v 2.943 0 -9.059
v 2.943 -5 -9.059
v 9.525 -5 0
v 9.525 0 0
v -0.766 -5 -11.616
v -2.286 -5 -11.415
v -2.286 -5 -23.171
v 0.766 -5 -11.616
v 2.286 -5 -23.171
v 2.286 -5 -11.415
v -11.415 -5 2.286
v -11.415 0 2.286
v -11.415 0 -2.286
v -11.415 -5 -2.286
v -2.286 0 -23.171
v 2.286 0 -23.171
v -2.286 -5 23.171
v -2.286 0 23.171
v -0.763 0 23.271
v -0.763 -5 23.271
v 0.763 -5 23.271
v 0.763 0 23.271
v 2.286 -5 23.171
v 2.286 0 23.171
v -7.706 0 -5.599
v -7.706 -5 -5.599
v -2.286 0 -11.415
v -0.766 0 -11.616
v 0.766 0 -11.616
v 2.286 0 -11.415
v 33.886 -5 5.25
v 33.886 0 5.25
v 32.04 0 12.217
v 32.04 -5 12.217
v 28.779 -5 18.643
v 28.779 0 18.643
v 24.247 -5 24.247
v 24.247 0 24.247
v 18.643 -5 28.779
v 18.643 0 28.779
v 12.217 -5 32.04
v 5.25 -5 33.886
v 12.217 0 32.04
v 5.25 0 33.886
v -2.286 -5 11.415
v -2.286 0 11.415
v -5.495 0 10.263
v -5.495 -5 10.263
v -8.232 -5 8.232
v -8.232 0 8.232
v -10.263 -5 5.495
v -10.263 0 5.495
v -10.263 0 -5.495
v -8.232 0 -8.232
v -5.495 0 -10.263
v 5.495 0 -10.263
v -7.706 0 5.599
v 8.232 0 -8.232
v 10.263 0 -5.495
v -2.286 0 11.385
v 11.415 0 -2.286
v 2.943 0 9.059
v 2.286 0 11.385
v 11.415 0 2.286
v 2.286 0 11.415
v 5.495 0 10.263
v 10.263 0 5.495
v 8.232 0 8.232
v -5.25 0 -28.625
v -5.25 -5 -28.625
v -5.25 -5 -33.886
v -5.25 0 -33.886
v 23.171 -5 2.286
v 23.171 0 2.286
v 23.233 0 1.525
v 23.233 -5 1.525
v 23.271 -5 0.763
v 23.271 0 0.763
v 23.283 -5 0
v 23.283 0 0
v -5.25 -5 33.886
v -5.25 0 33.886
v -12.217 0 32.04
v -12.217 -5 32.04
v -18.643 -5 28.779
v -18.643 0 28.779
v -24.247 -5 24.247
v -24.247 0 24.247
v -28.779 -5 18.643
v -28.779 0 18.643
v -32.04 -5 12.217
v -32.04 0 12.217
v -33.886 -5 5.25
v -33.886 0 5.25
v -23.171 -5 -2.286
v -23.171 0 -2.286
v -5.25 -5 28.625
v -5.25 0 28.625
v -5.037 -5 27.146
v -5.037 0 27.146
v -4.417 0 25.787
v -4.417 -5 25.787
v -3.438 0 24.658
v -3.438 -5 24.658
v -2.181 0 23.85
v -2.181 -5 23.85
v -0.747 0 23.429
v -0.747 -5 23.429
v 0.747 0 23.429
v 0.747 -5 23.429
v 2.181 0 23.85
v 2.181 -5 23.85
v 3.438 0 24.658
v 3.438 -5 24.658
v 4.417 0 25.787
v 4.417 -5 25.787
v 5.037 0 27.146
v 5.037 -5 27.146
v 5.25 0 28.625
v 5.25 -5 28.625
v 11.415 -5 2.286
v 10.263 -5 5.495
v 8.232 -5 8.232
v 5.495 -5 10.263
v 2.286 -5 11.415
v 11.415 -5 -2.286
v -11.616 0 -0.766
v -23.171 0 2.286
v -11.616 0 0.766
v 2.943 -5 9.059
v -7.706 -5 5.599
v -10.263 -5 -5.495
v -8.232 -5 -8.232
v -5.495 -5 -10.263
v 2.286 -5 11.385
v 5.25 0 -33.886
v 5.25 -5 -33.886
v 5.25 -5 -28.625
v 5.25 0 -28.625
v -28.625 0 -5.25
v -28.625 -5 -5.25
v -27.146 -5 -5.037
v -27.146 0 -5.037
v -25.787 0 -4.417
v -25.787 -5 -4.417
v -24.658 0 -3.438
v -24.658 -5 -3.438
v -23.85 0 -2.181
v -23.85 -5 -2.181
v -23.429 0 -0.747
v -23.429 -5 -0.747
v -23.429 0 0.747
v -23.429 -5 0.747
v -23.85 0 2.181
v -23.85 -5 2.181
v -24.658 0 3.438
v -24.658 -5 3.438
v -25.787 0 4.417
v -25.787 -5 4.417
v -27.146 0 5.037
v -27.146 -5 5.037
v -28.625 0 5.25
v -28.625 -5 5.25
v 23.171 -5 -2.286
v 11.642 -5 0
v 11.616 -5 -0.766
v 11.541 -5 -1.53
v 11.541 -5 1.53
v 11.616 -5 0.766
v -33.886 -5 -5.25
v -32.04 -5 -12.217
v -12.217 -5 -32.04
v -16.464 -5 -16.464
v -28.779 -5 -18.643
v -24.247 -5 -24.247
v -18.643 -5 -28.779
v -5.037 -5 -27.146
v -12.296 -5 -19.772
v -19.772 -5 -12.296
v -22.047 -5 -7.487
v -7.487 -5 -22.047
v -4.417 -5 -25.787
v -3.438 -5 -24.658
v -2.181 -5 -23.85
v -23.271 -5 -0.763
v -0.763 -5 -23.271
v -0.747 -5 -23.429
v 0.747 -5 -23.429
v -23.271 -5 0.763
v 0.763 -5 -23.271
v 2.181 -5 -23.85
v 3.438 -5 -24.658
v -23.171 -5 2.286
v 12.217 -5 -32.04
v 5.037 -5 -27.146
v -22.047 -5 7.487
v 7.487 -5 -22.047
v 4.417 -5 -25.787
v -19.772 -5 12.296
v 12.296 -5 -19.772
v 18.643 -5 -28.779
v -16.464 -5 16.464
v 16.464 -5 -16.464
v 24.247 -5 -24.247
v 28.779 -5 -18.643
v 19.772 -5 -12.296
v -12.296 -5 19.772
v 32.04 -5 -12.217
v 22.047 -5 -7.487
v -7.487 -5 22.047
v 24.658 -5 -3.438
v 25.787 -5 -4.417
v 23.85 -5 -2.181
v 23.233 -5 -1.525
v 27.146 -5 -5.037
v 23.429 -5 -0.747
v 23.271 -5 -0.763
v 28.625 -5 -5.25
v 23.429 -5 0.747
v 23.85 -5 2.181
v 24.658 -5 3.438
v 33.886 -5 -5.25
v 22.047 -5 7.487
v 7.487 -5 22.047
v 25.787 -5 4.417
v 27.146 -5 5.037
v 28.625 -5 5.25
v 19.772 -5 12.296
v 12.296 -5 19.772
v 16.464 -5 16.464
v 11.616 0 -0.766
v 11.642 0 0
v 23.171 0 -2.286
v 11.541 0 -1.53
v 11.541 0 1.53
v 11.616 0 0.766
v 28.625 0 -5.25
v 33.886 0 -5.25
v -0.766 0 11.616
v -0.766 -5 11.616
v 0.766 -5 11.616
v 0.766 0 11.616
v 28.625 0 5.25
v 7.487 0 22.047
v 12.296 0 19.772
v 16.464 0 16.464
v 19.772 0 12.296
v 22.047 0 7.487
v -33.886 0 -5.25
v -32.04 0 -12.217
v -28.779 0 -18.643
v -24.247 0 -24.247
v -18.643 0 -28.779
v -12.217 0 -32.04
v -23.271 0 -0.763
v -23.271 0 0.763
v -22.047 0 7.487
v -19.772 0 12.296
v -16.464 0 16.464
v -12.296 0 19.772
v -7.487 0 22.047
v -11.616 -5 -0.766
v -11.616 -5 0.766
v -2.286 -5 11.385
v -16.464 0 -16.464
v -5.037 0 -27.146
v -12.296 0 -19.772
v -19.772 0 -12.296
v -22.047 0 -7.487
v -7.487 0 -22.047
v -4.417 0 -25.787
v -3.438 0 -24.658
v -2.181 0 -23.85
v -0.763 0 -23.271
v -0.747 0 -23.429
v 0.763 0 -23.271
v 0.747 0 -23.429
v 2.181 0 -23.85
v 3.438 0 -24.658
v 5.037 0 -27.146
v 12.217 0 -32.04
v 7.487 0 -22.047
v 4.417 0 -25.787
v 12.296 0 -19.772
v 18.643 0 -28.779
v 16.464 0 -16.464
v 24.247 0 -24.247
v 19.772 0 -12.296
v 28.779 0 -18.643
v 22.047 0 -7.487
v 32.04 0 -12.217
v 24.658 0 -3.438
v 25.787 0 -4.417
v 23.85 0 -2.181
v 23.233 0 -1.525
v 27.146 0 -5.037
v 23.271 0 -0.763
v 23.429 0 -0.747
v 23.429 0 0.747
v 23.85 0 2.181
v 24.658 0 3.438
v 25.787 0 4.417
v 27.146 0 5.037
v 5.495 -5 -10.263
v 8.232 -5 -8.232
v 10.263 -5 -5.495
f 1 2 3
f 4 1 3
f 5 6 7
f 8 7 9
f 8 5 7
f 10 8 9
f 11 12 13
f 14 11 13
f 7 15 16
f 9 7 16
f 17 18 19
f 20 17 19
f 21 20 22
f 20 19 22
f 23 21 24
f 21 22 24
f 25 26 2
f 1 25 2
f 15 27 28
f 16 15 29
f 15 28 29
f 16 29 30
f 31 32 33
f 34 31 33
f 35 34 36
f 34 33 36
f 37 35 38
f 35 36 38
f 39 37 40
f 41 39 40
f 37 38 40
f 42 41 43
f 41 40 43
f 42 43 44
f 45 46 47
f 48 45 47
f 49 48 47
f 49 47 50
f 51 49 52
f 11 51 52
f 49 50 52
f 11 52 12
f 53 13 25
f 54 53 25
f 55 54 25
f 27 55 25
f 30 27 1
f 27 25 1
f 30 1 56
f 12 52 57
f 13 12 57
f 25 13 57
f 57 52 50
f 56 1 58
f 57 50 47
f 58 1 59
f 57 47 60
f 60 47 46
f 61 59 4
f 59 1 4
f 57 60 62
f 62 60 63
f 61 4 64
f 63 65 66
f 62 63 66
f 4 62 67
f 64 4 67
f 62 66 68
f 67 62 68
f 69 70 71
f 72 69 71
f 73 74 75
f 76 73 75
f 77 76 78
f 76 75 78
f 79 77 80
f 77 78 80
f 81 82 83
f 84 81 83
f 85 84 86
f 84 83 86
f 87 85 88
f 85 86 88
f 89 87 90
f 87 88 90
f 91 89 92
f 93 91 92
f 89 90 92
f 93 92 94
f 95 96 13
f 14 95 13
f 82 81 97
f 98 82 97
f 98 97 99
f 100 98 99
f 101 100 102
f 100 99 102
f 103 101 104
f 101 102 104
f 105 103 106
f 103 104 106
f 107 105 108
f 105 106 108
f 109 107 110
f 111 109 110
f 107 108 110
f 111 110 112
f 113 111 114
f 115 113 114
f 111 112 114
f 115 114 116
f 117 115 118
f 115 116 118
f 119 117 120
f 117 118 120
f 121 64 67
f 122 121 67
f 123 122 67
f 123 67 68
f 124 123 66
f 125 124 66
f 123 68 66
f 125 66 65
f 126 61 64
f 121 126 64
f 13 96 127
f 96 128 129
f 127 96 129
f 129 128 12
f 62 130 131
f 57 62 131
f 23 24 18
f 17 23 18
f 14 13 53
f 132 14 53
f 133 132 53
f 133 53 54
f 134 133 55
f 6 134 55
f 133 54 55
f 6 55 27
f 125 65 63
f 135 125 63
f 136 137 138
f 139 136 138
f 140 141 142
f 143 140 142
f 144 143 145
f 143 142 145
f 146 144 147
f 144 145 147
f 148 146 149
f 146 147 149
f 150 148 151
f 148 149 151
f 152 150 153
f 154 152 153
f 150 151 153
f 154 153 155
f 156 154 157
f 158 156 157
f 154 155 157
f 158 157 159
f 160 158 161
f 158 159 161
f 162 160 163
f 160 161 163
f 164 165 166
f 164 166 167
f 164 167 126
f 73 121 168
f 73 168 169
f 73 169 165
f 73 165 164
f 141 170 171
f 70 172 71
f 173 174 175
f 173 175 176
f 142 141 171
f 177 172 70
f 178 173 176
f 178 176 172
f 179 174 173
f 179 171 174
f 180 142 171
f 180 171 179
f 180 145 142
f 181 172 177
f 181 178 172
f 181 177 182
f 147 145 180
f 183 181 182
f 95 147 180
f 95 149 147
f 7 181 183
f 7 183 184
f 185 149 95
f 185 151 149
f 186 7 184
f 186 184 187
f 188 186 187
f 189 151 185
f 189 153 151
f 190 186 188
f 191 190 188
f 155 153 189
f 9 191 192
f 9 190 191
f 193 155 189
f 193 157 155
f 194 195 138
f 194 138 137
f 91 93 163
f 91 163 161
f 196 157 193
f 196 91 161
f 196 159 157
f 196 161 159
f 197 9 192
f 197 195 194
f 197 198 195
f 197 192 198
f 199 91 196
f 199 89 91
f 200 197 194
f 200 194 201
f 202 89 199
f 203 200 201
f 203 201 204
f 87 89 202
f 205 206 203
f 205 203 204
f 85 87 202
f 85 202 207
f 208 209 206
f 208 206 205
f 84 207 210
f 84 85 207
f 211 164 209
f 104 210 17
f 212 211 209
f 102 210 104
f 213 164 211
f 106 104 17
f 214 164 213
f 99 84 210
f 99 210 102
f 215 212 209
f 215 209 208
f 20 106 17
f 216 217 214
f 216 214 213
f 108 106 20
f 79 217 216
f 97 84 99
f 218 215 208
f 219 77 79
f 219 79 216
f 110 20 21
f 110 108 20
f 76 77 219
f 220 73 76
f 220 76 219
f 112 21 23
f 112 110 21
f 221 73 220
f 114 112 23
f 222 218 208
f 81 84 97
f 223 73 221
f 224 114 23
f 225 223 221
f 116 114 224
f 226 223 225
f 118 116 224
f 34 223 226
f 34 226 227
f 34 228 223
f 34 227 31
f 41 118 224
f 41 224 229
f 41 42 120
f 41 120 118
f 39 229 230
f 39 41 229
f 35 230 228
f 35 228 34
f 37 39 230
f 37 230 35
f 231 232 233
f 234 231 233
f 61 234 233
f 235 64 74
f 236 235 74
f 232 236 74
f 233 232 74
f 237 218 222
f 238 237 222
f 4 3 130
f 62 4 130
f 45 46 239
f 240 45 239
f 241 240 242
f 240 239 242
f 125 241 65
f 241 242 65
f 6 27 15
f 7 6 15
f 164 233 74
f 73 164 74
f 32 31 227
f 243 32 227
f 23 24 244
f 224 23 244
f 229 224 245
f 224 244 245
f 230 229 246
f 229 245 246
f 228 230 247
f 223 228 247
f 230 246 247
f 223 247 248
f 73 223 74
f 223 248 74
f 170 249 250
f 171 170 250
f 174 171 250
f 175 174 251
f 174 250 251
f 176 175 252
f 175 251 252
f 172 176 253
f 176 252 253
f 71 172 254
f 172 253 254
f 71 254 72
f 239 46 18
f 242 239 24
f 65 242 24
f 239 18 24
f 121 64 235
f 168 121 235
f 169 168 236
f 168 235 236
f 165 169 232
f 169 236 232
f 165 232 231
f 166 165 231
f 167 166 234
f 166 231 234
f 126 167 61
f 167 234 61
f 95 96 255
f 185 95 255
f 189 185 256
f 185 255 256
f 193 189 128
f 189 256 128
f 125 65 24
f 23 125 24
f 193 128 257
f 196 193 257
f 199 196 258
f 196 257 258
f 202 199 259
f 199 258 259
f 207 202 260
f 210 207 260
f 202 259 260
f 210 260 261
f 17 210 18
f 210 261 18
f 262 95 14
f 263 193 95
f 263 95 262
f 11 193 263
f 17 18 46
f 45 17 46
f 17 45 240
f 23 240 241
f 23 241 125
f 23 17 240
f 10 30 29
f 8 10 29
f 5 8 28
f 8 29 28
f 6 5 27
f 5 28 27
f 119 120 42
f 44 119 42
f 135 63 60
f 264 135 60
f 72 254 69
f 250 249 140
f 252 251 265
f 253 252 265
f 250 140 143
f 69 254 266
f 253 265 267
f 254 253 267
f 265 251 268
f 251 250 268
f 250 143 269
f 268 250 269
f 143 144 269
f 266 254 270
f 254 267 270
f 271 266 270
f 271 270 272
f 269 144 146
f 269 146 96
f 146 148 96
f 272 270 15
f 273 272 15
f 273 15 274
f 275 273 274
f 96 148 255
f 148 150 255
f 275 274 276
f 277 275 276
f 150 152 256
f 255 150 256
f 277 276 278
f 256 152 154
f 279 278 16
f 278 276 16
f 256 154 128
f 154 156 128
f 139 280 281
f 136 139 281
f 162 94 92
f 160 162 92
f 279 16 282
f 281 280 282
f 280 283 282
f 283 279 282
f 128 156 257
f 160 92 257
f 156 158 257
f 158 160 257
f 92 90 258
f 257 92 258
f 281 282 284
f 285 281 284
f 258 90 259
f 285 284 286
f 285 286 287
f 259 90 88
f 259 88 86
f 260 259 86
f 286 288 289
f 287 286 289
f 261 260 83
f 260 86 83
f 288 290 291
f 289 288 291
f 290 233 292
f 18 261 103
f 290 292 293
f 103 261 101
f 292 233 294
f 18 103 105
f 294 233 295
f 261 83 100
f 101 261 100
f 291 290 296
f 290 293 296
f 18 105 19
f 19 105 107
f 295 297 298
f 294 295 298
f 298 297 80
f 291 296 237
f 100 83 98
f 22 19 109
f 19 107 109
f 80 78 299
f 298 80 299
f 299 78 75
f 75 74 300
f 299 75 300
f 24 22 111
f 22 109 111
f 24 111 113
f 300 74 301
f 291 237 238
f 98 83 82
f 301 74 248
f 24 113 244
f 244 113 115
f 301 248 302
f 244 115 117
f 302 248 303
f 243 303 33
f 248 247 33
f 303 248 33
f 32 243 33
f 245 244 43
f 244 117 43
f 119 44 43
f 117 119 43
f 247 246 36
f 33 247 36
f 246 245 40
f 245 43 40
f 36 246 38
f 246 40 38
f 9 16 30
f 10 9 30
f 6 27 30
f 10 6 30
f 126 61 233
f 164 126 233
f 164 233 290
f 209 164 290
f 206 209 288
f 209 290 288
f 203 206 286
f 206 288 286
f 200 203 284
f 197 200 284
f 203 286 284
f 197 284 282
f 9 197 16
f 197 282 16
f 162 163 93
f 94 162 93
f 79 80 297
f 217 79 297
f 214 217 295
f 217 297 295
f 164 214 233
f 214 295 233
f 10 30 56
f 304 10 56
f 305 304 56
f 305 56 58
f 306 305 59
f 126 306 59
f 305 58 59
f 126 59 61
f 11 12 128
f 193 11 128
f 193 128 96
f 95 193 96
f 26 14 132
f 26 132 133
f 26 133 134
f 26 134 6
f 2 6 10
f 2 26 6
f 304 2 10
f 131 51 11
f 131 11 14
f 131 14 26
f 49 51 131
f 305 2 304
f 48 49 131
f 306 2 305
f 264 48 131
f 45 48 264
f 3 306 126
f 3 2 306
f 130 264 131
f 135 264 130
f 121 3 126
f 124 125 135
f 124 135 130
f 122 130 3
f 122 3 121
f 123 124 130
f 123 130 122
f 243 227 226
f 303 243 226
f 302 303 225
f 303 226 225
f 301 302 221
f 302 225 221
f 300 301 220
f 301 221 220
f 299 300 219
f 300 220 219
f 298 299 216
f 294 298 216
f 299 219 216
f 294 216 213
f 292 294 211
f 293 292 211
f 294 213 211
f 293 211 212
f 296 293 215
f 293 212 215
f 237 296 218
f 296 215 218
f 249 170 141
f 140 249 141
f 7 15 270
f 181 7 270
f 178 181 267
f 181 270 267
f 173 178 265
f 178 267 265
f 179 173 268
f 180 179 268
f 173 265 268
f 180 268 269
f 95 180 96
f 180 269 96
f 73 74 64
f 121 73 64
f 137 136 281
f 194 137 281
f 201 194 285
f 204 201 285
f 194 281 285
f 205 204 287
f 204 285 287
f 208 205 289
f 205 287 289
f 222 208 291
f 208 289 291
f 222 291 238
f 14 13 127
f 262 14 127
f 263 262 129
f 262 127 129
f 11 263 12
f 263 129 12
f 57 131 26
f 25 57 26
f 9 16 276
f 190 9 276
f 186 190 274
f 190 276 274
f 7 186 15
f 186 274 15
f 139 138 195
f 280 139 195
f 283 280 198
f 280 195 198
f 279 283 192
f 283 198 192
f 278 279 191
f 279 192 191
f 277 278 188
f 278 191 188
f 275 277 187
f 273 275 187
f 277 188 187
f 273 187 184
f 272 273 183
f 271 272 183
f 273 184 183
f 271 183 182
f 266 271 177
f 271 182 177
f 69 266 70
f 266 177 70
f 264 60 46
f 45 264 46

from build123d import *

# Parameters (mm, degrees)
F1_DEPTH = 5
F0_R     = 34.29
F3_DEPTH = 5.001
F5_DEPTH = 5.001


with BuildPart() as f1:
    # F0 (on Front) → F1 (new body)
    with BuildSketch(Plane.XZ):
        with BuildLine():
            ThreePointArc((-11.4150167226, -2.286), (-11.6416666667, 0), (-11.4150167226, 2.286))
            Line((-11.4150167226, 2.286), (-23.1708397584, 2.286))
            Line((-23.1708397584, 2.286), (-23.1708397584, -2.286))
            Line((-23.1708397584, -2.286), (-11.4150167226, -2.286))
        make_face()
    extrude(amount=F1_DEPTH)


with BuildPart() as f1b:
    # F0 (on Front) → F1, piece 2 (new body)
    with BuildSketch(Plane.XZ):
        with BuildLine():
            Line((11.4150167226, -2.286), (11.4150167226, 2.286))
            ThreePointArc((11.4150167226, 2.286), (8.2319014443, 8.2319014443), (2.286, 11.4150167226))
            Line((2.286, 11.4150167226), (2.286, 11.3852397584))
            Line((2.286, 11.3852397584), (-2.286, 11.3852397584))
            Line((-2.286, 11.3852397584), (-2.286, 11.4150167226))
            ThreePointArc((-2.286, 11.4150167226), (-8.2319014443, 8.2319014443), (-11.4150167226, 2.286))
            Line((-11.4150167226, 2.286), (-11.4150167226, -2.286))
            ThreePointArc((-11.4150167226, -2.286), (-8.2319014443, -8.2319014443), (-2.286, -11.4150167226))
            Line((-2.286, -11.4150167226), (2.286, -11.4150167226))
            ThreePointArc((2.286, -11.4150167226), (8.2319014443, -8.2319014443), (11.4150167226, -2.286))
        make_face()
    extrude(amount=F1_DEPTH)

    # F4 (on face) → F5 (cut, through all)
    with BuildSketch(Plane.XZ.offset(5)):
        Polygon((2.9433868714, -9.0588133177), (9.525, 0), (2.9433868714, 9.0588133177), (-7.7058868714, 5.5986545281), (-7.7058868714, -5.5986545281), align=None)
    extrude(amount=-F5_DEPTH, mode=Mode.SUBTRACT)


with BuildPart() as f1c:
    # F0 (on Front) → F1, piece 3 (new body)
    with BuildSketch(Plane.XZ):
        with BuildLine():
            ThreePointArc((-2.286, 11.4150167226), (0, 11.6416666667), (2.286, 11.4150167226))
            Line((2.286, 11.4150167226), (2.286, 23.1708397584))
            Line((2.286, 23.1708397584), (-2.286, 23.1708397584))
            Line((-2.286, 23.1708397584), (-2.286, 11.4150167226))
        make_face()
    extrude(amount=F1_DEPTH)


with BuildPart() as f1d:
    # F0 (on Front) → F1, piece 4 (new body)
    with BuildSketch(Plane.XZ):
        with BuildLine():
            ThreePointArc((11.4150167226, 2.286), (11.5848656112, 1.1486041743), (11.6416666667, 0))
            ThreePointArc((11.6416666667, 0), (11.5848656112, -1.1486041743), (11.4150167226, -2.286))
            Line((11.4150167226, -2.286), (23.1708397584, -2.286))
            Line((23.1708397584, -2.286), (23.1708397584, 2.286))
            Line((23.1708397584, 2.286), (11.4150167226, 2.286))
        make_face()
    extrude(amount=F1_DEPTH)


with BuildPart() as f1e:
    # F0 (on Front) → F1, piece 5 (new body)
    with BuildSketch(Plane.XZ):
        with BuildLine():
            Line((2.286, -23.1708397584), (2.286, -11.4150167226))
            ThreePointArc((2.286, -11.4150167226), (0, -11.6416666667), (-2.286, -11.4150167226))
            Line((-2.286, -11.4150167226), (-2.286, -23.1708397584))
            Line((-2.286, -23.1708397584), (2.286, -23.1708397584))
        make_face()
    extrude(amount=F1_DEPTH)


with BuildPart() as f1f:
    # F0 (on Front) → F1, piece 6 (new body)
    with BuildSketch(Plane.XZ):
        Circle(F0_R)
        with BuildLine():
            ThreePointArc((2.286, 23.1708397584), (16.4638028886, 16.4638028886), (23.1708397584, 2.286))
            ThreePointArc((23.1708397584, 2.286), (23.2551929343, 1.1443831094), (23.2833333333, 0))
            ThreePointArc((23.2833333333, 0), (23.2551929343, -1.1443831094), (23.1708397584, -2.286))
            ThreePointArc((23.1708397584, -2.286), (16.4638028886, -16.4638028886), (2.286, -23.1708397584))
            ThreePointArc((2.286, -23.1708397584), (0, -23.2833333333), (-2.286, -23.1708397584))
            ThreePointArc((-2.286, -23.1708397584), (-16.4638028886, -16.4638028886), (-23.1708397584, -2.286))
            ThreePointArc((-23.1708397584, -2.286), (-23.2833333333, 0), (-23.1708397584, 2.286))
            ThreePointArc((-23.1708397584, 2.286), (-16.4638028886, 16.4638028886), (-2.286, 23.1708397584))
            ThreePointArc((-2.286, 23.1708397584), (0, 23.2833333333), (2.286, 23.1708397584))
        make_face(mode=Mode.SUBTRACT)
    extrude(amount=F1_DEPTH)

    # F2 (on face) → F3 (cut, through all)
    with BuildSketch(Plane.XZ.offset(5)):
        with BuildLine():
            Line((28.6253821723, -5.25), (33.8857138039, -5.25))
            ThreePointArc((33.8857138039, -5.25), (34.1887790535, -2.6327717015), (34.29, 0))
            ThreePointArc((34.29, 0), (34.1887790535, 2.6327717015), (33.8857138039, 5.25))
            Line((33.8857138039, 5.25), (28.6253821723, 5.25))
            ThreePointArc((28.6253821723, 5.25), (23.3753821723, 0), (28.6253821723, -5.25))
        make_face()
        with BuildLine():
            Line((5.25, -33.8857138039), (5.25, -28.6253821723))
            ThreePointArc((5.25, -28.6253821723), (0, -23.3753821723), (-5.25, -28.6253821723))
            Line((-5.25, -28.6253821723), (-5.25, -33.8857138039))
            ThreePointArc((-5.25, -33.8857138039), (0, -34.29), (5.25, -33.8857138039))
        make_face()
        with BuildLine():
            ThreePointArc((-33.8857138039, 5.25), (-34.29, 0), (-33.8857138039, -5.25))
            Line((-33.8857138039, -5.25), (-28.6253821723, -5.25))
            ThreePointArc((-28.6253821723, -5.25), (-23.3753821723, 0), (-28.6253821723, 5.25))
            Line((-28.6253821723, 5.25), (-33.8857138039, 5.25))
        make_face()
        with BuildLine():
            ThreePointArc((5.25, 33.8857138039), (0, 34.29), (-5.25, 33.8857138039))
            Line((-5.25, 33.8857138039), (-5.25, 28.6253821723))
            ThreePointArc((-5.25, 28.6253821723), (0, 23.3753821723), (5.25, 28.6253821723))
            Line((5.25, 28.6253821723), (5.25, 33.8857138039))
        make_face()
    extrude(amount=-F3_DEPTH, mode=Mode.SUBTRACT)


solid = Compound([f1.part, f1b.part, f1c.part, f1d.part, f1e.part, f1f.part])
